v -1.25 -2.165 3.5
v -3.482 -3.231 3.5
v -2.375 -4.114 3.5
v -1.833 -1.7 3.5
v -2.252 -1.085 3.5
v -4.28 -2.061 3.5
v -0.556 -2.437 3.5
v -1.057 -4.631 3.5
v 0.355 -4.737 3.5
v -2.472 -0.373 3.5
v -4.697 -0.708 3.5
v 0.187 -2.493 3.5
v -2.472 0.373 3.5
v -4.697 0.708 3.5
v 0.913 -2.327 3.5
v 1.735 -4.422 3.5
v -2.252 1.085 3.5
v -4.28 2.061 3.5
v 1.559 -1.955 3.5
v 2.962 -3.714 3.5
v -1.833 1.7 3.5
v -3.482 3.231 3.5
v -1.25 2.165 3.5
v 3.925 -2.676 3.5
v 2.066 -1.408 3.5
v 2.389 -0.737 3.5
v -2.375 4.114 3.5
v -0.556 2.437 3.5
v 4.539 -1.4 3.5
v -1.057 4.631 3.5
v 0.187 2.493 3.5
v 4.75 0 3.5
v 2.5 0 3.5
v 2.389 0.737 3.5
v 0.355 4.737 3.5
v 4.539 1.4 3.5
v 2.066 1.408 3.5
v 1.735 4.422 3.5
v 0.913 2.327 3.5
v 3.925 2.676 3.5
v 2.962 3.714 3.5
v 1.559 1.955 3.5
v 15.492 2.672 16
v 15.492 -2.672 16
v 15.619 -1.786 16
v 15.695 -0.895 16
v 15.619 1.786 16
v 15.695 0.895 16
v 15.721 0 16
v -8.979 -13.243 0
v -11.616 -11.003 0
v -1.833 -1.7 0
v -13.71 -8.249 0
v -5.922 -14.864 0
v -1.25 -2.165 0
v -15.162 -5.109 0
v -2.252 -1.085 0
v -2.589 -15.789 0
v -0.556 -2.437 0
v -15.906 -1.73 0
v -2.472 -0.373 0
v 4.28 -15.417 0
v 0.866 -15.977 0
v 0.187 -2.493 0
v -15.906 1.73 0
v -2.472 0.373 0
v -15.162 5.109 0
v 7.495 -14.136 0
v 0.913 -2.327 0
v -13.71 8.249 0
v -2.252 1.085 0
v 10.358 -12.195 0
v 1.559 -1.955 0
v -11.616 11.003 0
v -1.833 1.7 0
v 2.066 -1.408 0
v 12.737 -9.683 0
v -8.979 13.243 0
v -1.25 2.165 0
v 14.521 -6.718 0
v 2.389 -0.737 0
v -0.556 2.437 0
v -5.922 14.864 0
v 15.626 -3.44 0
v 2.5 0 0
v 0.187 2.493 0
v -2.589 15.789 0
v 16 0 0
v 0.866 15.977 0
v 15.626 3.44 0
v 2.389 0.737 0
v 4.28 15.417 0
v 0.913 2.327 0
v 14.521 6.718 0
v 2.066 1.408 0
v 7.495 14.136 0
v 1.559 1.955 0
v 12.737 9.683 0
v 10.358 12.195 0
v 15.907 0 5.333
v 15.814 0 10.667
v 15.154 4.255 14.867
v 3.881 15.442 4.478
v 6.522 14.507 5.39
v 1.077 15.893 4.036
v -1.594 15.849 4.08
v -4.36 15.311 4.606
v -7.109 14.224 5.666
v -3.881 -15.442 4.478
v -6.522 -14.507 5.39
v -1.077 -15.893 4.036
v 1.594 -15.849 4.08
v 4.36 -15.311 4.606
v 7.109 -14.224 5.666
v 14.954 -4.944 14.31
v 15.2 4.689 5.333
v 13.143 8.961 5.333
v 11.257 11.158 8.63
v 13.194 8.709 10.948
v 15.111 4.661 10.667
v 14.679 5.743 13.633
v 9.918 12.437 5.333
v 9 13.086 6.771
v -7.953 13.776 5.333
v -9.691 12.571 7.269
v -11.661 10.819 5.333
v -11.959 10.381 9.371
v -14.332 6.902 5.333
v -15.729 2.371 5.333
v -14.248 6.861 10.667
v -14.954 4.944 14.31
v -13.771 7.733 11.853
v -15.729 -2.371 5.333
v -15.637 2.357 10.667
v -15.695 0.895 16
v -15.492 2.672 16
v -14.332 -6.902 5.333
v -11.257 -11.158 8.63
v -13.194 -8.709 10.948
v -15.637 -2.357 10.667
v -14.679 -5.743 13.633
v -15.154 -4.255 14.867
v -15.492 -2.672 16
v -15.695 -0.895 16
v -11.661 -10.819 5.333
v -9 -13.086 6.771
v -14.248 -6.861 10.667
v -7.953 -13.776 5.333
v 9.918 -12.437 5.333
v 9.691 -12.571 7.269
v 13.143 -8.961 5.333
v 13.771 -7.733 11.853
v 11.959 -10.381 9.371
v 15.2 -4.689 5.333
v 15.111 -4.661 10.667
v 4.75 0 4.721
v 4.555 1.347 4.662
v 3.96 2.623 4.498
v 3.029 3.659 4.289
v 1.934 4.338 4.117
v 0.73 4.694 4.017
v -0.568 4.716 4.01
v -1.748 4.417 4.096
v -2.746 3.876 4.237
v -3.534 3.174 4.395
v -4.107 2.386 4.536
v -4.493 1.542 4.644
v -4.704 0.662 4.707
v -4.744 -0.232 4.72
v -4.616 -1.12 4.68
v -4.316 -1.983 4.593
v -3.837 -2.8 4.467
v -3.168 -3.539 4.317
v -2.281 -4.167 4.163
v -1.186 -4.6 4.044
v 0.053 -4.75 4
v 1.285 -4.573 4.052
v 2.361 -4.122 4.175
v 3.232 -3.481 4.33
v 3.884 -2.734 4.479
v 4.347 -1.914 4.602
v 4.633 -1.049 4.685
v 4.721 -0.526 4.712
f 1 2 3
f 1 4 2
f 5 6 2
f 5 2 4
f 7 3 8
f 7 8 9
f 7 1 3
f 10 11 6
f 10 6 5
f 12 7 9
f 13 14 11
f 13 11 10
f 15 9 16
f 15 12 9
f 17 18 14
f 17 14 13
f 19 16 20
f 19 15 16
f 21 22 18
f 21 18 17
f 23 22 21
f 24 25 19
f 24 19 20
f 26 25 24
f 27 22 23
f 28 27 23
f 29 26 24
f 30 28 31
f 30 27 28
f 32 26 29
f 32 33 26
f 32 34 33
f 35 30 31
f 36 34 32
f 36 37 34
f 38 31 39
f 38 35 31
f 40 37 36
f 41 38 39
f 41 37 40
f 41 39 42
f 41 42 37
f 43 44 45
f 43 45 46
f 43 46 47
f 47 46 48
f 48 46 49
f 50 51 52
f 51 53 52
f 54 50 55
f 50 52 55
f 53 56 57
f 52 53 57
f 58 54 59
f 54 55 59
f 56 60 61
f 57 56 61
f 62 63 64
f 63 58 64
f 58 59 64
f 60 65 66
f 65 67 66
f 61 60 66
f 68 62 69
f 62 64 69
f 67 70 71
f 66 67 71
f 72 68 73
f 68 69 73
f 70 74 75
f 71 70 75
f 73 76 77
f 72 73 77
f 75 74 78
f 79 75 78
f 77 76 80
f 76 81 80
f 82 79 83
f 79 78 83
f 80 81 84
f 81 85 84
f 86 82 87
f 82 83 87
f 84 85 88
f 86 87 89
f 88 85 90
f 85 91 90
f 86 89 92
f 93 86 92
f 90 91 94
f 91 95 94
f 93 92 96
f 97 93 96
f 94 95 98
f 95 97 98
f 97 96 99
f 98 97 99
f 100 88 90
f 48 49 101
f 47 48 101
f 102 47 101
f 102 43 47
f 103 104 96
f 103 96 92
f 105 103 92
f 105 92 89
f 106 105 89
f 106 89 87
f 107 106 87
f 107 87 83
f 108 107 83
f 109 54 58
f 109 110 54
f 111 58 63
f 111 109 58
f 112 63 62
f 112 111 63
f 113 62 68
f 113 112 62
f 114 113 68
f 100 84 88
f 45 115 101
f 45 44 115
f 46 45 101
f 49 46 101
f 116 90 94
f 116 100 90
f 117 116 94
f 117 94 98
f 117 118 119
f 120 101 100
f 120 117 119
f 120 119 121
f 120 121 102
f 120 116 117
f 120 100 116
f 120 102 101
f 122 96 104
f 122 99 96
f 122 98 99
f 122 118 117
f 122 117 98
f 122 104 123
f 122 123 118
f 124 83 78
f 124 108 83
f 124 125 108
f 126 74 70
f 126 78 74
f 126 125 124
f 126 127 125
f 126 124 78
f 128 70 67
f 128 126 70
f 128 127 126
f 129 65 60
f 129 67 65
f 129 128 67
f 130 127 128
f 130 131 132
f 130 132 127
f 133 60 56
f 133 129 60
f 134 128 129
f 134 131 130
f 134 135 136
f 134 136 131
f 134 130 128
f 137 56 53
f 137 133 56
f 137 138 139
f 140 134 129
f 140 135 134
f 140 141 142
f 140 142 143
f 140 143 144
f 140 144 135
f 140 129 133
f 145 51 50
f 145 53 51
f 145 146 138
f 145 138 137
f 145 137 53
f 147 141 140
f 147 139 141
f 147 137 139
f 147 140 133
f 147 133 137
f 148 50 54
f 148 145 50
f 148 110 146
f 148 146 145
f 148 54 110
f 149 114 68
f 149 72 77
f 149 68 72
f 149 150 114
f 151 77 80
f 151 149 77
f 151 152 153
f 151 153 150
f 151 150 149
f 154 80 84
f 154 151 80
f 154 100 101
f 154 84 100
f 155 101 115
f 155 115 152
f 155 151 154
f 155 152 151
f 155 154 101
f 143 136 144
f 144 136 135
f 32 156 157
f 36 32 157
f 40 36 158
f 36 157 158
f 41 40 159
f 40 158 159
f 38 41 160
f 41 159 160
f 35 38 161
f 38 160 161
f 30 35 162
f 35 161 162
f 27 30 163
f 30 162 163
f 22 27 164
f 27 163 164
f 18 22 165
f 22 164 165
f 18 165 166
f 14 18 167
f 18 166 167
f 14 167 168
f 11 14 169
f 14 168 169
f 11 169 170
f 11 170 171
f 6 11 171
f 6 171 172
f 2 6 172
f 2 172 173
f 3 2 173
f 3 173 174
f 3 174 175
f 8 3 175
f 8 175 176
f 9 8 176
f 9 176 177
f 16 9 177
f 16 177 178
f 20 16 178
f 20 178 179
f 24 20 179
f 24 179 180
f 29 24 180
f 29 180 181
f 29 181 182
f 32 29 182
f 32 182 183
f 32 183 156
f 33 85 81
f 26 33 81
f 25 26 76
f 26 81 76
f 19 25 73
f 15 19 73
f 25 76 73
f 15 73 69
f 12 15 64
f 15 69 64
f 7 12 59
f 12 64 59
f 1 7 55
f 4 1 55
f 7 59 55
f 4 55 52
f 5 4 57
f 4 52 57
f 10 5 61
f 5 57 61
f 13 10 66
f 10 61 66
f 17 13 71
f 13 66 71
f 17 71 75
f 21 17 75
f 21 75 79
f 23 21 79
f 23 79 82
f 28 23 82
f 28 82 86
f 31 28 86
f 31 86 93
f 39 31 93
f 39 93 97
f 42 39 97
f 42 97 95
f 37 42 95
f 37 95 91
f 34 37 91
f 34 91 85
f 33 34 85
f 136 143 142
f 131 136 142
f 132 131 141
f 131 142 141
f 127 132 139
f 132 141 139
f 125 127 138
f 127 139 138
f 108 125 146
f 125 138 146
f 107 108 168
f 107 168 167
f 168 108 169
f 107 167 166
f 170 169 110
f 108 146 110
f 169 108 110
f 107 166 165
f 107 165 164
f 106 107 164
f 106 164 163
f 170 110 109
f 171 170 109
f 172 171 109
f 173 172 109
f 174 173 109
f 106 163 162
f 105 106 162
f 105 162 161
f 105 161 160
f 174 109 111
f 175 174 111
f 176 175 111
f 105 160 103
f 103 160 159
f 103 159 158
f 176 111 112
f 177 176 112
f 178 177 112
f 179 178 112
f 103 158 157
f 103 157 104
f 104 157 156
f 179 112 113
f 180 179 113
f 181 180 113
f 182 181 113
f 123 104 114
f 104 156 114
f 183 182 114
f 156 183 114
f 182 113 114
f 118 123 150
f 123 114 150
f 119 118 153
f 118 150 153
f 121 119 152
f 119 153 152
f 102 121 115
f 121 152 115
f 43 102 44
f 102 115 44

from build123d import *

# Parameters (mm, degrees)
F0_R     = 16
F1_DEPTH = 16
F1_TAPER = 1
F2_R     = 16
F3_DEPTH = 16
F4_R     = 2.5
F5_DEPTH = 5
F7_R     = 4.75
F8_DEPTH = 1.5


with BuildPart() as f1:
    # F0 (on Top) → F1 (new body)
    with BuildSketch(Plane.XY):
        Circle(F0_R)
    extrude(amount=F1_DEPTH, taper=F1_TAPER)

    # F2 (on Front) → F3 (cut, symmetric)
    with BuildSketch(Plane.XZ):
        with Locations((0, 20)):
            Circle(F2_R)
    extrude(amount=F3_DEPTH, both=True, mode=Mode.SUBTRACT)

    # F4 (on face) → F5 (cut)
    with BuildSketch(Plane(origin=(0, 0, 0), x_dir=(1, 0, 0), z_dir=(0, 0, -1))):
        Circle(F4_R)
    extrude(amount=-F5_DEPTH, mode=Mode.SUBTRACT)

    # F7 (on offset) → F8 (cut)
    with BuildSketch(Plane.XY.offset(5)):
        Circle(F7_R)
    extrude(amount=-F8_DEPTH, mode=Mode.SUBTRACT)


solid = f1.part
